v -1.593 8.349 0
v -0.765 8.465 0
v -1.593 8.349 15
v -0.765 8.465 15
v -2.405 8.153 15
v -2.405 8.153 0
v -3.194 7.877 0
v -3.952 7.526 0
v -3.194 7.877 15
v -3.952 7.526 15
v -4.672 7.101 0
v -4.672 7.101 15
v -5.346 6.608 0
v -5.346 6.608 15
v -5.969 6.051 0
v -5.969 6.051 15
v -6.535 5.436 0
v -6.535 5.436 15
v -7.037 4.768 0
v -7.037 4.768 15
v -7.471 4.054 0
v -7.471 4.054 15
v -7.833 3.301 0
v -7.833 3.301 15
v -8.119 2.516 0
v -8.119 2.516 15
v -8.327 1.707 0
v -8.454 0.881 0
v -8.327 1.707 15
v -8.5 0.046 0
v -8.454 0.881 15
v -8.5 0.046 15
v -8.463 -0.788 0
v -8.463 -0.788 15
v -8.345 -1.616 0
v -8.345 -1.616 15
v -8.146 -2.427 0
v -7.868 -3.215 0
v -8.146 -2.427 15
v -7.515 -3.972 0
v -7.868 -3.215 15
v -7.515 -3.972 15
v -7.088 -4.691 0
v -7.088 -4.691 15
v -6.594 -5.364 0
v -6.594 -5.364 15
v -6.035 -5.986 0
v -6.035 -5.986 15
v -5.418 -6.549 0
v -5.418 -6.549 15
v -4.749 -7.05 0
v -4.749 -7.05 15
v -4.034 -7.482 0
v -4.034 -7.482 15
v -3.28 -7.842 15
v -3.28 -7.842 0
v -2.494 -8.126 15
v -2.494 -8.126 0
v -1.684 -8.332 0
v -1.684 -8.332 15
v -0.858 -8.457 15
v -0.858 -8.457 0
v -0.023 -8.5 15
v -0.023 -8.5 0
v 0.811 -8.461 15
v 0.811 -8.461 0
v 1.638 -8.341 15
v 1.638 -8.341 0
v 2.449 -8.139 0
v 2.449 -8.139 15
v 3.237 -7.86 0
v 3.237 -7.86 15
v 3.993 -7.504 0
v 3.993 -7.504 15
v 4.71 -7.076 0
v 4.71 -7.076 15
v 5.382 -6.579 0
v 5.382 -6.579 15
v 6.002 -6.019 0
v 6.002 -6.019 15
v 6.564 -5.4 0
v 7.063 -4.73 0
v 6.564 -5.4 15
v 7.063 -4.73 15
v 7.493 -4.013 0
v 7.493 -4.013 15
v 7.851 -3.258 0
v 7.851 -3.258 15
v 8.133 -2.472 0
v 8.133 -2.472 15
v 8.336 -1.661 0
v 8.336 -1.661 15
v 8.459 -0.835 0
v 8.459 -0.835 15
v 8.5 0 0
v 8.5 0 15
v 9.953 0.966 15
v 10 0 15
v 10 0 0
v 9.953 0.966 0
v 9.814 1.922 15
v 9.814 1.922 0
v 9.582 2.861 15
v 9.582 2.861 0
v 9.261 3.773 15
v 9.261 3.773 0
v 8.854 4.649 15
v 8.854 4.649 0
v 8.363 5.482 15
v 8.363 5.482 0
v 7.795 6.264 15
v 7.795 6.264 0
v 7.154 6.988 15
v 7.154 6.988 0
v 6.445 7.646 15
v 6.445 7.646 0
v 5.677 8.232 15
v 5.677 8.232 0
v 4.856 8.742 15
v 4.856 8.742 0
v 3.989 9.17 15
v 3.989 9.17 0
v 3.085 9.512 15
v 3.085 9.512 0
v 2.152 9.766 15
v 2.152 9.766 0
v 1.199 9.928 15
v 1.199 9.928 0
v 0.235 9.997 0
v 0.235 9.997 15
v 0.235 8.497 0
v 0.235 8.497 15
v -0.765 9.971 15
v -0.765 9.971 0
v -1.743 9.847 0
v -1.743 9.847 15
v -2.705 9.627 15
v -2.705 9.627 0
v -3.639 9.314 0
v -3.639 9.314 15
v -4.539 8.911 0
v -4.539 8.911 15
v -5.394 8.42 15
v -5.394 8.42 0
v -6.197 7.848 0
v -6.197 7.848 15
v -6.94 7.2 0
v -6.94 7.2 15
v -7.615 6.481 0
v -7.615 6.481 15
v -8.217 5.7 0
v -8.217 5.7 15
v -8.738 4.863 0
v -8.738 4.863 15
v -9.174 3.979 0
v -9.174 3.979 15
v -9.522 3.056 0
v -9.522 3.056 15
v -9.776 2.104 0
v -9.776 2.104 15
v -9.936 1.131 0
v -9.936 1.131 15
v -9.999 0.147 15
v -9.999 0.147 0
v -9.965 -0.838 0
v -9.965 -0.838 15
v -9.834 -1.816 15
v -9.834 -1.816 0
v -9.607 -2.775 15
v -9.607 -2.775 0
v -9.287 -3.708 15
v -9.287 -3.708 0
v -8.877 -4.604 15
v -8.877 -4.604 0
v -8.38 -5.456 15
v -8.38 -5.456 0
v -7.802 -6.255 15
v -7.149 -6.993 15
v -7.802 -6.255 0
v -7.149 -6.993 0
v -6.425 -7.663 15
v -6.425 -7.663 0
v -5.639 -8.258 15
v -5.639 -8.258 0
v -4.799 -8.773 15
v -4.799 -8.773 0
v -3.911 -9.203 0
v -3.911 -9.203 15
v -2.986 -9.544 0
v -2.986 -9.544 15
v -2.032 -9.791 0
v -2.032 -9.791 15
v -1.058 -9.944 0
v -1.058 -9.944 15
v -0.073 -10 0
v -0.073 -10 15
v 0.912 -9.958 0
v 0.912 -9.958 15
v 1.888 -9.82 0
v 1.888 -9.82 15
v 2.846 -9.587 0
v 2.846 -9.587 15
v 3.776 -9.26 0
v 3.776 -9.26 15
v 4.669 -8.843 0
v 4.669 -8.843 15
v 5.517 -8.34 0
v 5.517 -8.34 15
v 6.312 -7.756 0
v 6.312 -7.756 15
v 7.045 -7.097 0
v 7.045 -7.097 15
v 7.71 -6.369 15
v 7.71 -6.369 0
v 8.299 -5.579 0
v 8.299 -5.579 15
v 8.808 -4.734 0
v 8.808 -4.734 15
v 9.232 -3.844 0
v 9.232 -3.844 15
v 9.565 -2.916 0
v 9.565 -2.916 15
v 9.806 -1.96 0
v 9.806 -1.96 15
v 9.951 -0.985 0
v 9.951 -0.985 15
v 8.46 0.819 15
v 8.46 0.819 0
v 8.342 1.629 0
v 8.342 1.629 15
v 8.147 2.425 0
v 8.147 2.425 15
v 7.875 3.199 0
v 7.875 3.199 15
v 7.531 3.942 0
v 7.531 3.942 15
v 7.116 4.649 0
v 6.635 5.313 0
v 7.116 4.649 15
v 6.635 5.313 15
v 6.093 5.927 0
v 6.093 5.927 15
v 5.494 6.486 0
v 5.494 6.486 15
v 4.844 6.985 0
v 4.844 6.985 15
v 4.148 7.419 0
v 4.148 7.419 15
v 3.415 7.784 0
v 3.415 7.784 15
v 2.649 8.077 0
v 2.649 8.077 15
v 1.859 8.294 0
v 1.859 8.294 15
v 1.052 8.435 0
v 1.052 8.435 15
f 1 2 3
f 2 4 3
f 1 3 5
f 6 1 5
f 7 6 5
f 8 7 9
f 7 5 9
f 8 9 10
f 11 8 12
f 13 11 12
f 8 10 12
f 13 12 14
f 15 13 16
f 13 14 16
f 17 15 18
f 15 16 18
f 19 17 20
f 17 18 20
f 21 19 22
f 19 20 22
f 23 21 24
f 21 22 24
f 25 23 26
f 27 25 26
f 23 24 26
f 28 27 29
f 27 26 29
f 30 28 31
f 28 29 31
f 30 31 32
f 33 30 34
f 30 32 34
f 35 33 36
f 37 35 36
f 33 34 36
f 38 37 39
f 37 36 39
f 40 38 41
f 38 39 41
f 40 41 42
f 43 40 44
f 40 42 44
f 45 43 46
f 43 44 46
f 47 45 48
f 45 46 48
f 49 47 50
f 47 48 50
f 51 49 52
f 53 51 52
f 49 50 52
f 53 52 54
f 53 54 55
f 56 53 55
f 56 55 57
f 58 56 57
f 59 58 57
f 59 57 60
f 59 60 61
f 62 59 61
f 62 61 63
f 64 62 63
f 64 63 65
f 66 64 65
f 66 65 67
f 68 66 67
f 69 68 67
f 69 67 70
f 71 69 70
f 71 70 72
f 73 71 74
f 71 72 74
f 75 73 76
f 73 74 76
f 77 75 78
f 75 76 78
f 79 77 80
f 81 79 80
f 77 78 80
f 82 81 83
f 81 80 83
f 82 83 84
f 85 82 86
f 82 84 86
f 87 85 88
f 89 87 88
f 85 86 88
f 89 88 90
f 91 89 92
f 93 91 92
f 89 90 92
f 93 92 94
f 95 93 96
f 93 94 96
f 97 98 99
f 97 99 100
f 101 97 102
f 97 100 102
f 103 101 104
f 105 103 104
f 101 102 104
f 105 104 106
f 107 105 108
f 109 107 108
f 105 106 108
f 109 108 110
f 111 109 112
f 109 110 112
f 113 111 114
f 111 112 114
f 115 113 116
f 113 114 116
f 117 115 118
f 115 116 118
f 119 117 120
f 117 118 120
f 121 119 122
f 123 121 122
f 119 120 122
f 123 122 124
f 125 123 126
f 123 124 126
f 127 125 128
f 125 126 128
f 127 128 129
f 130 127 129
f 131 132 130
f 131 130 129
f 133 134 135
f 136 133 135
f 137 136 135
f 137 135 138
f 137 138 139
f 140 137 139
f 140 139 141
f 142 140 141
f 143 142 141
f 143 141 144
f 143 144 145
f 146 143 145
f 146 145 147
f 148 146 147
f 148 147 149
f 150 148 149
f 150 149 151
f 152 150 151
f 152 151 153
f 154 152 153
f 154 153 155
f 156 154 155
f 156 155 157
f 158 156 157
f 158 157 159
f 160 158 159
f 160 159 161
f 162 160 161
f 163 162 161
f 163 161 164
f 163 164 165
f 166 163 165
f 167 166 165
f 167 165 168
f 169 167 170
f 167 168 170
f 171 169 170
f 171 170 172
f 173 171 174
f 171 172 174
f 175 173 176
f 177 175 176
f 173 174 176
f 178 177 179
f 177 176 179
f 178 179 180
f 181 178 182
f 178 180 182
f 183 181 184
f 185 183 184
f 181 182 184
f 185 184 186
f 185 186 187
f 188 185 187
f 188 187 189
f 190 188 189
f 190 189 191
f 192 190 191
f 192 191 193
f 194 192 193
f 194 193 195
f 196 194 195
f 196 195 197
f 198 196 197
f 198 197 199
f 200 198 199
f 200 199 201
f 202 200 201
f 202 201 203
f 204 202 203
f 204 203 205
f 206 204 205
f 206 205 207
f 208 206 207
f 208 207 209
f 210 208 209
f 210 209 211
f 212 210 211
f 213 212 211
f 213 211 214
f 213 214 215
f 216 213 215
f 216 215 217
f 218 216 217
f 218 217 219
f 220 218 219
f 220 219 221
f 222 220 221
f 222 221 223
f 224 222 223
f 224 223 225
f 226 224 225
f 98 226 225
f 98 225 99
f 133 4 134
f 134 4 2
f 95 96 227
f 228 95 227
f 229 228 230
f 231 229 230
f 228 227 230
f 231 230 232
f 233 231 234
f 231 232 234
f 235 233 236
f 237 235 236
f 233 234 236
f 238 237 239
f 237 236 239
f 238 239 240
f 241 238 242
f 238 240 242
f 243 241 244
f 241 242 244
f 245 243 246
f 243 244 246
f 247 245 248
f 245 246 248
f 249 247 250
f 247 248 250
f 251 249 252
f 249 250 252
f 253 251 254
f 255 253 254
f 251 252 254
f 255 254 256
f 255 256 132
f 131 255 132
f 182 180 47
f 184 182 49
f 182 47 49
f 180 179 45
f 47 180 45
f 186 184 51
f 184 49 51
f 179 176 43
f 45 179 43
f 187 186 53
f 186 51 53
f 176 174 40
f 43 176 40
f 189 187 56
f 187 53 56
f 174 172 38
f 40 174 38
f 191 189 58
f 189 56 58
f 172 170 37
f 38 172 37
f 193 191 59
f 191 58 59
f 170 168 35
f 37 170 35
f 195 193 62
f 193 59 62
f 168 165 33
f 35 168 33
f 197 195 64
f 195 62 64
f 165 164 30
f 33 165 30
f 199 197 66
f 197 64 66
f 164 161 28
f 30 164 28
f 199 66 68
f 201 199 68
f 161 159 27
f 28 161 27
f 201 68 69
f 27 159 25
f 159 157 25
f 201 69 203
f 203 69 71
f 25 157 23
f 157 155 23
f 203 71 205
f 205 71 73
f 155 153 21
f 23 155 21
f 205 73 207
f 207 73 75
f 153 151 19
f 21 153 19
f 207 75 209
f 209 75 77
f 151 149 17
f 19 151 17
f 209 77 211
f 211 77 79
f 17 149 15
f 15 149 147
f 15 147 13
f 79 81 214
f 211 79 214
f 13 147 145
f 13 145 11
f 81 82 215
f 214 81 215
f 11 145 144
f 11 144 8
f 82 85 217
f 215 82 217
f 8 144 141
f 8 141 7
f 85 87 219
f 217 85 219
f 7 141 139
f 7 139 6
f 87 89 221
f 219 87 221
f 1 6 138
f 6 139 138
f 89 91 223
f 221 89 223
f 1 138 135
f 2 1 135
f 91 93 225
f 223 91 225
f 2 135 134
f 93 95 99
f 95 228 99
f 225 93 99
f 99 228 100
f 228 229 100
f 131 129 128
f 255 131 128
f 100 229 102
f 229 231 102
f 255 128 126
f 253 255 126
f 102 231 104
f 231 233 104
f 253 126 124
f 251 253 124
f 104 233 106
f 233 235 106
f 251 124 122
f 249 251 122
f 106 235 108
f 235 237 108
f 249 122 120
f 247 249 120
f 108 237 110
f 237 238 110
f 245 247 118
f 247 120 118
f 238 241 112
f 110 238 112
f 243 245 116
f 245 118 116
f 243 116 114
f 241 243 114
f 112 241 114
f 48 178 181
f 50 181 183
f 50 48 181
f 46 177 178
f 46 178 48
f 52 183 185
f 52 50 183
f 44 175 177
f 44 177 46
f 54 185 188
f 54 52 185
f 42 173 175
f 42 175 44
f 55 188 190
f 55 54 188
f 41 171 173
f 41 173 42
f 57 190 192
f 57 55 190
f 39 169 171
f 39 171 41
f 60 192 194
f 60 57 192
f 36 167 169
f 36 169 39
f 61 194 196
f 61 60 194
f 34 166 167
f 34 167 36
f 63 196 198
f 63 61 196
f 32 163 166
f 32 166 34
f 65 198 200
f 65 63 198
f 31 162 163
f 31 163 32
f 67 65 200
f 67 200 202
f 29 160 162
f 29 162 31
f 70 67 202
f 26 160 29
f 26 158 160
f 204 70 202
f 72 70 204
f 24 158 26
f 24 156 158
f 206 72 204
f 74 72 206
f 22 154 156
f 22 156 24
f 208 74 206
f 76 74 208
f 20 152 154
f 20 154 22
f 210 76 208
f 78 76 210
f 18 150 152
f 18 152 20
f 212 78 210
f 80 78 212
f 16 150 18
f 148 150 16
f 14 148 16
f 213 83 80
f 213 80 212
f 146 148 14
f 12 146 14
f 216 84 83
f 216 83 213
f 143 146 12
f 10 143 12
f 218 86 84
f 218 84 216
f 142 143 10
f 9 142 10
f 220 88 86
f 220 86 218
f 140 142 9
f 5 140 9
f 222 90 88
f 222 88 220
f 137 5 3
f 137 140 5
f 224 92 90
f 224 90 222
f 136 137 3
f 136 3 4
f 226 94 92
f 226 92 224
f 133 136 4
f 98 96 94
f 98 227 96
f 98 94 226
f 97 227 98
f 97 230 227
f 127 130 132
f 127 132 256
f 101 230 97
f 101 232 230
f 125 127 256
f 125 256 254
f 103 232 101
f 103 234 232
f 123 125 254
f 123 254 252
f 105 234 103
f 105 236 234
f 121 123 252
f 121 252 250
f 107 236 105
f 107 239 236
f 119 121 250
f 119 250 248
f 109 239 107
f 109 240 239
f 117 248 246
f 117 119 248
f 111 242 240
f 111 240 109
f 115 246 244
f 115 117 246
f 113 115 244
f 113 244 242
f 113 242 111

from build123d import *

# Parameters (mm, degrees)
SKETCH1_R           = 10
BOSS_EXTRUDE1_DEPTH = 15
SKETCH3_R           = 8.5
CUT_EXTRUDE1_DEPTH  = 19
SKETCH4_W           = 1
SKETCH4_H           = 15
CUT_EXTRUDE3_DEPTH  = 3


with BuildPart() as part:
    # Sketch1 → Boss-Extrude1 (new body)
    with BuildSketch(Plane.XY):
        Circle(SKETCH1_R)
    extrude(amount=BOSS_EXTRUDE1_DEPTH)

    # Sketch3 → Cut-Extrude1 (cut)
    with BuildSketch(Plane.XY.offset(15)):
        Circle(SKETCH3_R)
    extrude(amount=-CUT_EXTRUDE1_DEPTH, mode=Mode.SUBTRACT)

    # Sketch4 → Cut-Extrude3 (cut)
    with BuildSketch(Plane(origin=(0, 8, 0), x_dir=(1, 0, 0), z_dir=(0, 1, 0))):
        with Locations((-0.265251336, -7.5)):
            Rectangle(SKETCH4_W, SKETCH4_H)
    extrude(amount=CUT_EXTRUDE3_DEPTH, mode=Mode.SUBTRACT)


solid = part.part
